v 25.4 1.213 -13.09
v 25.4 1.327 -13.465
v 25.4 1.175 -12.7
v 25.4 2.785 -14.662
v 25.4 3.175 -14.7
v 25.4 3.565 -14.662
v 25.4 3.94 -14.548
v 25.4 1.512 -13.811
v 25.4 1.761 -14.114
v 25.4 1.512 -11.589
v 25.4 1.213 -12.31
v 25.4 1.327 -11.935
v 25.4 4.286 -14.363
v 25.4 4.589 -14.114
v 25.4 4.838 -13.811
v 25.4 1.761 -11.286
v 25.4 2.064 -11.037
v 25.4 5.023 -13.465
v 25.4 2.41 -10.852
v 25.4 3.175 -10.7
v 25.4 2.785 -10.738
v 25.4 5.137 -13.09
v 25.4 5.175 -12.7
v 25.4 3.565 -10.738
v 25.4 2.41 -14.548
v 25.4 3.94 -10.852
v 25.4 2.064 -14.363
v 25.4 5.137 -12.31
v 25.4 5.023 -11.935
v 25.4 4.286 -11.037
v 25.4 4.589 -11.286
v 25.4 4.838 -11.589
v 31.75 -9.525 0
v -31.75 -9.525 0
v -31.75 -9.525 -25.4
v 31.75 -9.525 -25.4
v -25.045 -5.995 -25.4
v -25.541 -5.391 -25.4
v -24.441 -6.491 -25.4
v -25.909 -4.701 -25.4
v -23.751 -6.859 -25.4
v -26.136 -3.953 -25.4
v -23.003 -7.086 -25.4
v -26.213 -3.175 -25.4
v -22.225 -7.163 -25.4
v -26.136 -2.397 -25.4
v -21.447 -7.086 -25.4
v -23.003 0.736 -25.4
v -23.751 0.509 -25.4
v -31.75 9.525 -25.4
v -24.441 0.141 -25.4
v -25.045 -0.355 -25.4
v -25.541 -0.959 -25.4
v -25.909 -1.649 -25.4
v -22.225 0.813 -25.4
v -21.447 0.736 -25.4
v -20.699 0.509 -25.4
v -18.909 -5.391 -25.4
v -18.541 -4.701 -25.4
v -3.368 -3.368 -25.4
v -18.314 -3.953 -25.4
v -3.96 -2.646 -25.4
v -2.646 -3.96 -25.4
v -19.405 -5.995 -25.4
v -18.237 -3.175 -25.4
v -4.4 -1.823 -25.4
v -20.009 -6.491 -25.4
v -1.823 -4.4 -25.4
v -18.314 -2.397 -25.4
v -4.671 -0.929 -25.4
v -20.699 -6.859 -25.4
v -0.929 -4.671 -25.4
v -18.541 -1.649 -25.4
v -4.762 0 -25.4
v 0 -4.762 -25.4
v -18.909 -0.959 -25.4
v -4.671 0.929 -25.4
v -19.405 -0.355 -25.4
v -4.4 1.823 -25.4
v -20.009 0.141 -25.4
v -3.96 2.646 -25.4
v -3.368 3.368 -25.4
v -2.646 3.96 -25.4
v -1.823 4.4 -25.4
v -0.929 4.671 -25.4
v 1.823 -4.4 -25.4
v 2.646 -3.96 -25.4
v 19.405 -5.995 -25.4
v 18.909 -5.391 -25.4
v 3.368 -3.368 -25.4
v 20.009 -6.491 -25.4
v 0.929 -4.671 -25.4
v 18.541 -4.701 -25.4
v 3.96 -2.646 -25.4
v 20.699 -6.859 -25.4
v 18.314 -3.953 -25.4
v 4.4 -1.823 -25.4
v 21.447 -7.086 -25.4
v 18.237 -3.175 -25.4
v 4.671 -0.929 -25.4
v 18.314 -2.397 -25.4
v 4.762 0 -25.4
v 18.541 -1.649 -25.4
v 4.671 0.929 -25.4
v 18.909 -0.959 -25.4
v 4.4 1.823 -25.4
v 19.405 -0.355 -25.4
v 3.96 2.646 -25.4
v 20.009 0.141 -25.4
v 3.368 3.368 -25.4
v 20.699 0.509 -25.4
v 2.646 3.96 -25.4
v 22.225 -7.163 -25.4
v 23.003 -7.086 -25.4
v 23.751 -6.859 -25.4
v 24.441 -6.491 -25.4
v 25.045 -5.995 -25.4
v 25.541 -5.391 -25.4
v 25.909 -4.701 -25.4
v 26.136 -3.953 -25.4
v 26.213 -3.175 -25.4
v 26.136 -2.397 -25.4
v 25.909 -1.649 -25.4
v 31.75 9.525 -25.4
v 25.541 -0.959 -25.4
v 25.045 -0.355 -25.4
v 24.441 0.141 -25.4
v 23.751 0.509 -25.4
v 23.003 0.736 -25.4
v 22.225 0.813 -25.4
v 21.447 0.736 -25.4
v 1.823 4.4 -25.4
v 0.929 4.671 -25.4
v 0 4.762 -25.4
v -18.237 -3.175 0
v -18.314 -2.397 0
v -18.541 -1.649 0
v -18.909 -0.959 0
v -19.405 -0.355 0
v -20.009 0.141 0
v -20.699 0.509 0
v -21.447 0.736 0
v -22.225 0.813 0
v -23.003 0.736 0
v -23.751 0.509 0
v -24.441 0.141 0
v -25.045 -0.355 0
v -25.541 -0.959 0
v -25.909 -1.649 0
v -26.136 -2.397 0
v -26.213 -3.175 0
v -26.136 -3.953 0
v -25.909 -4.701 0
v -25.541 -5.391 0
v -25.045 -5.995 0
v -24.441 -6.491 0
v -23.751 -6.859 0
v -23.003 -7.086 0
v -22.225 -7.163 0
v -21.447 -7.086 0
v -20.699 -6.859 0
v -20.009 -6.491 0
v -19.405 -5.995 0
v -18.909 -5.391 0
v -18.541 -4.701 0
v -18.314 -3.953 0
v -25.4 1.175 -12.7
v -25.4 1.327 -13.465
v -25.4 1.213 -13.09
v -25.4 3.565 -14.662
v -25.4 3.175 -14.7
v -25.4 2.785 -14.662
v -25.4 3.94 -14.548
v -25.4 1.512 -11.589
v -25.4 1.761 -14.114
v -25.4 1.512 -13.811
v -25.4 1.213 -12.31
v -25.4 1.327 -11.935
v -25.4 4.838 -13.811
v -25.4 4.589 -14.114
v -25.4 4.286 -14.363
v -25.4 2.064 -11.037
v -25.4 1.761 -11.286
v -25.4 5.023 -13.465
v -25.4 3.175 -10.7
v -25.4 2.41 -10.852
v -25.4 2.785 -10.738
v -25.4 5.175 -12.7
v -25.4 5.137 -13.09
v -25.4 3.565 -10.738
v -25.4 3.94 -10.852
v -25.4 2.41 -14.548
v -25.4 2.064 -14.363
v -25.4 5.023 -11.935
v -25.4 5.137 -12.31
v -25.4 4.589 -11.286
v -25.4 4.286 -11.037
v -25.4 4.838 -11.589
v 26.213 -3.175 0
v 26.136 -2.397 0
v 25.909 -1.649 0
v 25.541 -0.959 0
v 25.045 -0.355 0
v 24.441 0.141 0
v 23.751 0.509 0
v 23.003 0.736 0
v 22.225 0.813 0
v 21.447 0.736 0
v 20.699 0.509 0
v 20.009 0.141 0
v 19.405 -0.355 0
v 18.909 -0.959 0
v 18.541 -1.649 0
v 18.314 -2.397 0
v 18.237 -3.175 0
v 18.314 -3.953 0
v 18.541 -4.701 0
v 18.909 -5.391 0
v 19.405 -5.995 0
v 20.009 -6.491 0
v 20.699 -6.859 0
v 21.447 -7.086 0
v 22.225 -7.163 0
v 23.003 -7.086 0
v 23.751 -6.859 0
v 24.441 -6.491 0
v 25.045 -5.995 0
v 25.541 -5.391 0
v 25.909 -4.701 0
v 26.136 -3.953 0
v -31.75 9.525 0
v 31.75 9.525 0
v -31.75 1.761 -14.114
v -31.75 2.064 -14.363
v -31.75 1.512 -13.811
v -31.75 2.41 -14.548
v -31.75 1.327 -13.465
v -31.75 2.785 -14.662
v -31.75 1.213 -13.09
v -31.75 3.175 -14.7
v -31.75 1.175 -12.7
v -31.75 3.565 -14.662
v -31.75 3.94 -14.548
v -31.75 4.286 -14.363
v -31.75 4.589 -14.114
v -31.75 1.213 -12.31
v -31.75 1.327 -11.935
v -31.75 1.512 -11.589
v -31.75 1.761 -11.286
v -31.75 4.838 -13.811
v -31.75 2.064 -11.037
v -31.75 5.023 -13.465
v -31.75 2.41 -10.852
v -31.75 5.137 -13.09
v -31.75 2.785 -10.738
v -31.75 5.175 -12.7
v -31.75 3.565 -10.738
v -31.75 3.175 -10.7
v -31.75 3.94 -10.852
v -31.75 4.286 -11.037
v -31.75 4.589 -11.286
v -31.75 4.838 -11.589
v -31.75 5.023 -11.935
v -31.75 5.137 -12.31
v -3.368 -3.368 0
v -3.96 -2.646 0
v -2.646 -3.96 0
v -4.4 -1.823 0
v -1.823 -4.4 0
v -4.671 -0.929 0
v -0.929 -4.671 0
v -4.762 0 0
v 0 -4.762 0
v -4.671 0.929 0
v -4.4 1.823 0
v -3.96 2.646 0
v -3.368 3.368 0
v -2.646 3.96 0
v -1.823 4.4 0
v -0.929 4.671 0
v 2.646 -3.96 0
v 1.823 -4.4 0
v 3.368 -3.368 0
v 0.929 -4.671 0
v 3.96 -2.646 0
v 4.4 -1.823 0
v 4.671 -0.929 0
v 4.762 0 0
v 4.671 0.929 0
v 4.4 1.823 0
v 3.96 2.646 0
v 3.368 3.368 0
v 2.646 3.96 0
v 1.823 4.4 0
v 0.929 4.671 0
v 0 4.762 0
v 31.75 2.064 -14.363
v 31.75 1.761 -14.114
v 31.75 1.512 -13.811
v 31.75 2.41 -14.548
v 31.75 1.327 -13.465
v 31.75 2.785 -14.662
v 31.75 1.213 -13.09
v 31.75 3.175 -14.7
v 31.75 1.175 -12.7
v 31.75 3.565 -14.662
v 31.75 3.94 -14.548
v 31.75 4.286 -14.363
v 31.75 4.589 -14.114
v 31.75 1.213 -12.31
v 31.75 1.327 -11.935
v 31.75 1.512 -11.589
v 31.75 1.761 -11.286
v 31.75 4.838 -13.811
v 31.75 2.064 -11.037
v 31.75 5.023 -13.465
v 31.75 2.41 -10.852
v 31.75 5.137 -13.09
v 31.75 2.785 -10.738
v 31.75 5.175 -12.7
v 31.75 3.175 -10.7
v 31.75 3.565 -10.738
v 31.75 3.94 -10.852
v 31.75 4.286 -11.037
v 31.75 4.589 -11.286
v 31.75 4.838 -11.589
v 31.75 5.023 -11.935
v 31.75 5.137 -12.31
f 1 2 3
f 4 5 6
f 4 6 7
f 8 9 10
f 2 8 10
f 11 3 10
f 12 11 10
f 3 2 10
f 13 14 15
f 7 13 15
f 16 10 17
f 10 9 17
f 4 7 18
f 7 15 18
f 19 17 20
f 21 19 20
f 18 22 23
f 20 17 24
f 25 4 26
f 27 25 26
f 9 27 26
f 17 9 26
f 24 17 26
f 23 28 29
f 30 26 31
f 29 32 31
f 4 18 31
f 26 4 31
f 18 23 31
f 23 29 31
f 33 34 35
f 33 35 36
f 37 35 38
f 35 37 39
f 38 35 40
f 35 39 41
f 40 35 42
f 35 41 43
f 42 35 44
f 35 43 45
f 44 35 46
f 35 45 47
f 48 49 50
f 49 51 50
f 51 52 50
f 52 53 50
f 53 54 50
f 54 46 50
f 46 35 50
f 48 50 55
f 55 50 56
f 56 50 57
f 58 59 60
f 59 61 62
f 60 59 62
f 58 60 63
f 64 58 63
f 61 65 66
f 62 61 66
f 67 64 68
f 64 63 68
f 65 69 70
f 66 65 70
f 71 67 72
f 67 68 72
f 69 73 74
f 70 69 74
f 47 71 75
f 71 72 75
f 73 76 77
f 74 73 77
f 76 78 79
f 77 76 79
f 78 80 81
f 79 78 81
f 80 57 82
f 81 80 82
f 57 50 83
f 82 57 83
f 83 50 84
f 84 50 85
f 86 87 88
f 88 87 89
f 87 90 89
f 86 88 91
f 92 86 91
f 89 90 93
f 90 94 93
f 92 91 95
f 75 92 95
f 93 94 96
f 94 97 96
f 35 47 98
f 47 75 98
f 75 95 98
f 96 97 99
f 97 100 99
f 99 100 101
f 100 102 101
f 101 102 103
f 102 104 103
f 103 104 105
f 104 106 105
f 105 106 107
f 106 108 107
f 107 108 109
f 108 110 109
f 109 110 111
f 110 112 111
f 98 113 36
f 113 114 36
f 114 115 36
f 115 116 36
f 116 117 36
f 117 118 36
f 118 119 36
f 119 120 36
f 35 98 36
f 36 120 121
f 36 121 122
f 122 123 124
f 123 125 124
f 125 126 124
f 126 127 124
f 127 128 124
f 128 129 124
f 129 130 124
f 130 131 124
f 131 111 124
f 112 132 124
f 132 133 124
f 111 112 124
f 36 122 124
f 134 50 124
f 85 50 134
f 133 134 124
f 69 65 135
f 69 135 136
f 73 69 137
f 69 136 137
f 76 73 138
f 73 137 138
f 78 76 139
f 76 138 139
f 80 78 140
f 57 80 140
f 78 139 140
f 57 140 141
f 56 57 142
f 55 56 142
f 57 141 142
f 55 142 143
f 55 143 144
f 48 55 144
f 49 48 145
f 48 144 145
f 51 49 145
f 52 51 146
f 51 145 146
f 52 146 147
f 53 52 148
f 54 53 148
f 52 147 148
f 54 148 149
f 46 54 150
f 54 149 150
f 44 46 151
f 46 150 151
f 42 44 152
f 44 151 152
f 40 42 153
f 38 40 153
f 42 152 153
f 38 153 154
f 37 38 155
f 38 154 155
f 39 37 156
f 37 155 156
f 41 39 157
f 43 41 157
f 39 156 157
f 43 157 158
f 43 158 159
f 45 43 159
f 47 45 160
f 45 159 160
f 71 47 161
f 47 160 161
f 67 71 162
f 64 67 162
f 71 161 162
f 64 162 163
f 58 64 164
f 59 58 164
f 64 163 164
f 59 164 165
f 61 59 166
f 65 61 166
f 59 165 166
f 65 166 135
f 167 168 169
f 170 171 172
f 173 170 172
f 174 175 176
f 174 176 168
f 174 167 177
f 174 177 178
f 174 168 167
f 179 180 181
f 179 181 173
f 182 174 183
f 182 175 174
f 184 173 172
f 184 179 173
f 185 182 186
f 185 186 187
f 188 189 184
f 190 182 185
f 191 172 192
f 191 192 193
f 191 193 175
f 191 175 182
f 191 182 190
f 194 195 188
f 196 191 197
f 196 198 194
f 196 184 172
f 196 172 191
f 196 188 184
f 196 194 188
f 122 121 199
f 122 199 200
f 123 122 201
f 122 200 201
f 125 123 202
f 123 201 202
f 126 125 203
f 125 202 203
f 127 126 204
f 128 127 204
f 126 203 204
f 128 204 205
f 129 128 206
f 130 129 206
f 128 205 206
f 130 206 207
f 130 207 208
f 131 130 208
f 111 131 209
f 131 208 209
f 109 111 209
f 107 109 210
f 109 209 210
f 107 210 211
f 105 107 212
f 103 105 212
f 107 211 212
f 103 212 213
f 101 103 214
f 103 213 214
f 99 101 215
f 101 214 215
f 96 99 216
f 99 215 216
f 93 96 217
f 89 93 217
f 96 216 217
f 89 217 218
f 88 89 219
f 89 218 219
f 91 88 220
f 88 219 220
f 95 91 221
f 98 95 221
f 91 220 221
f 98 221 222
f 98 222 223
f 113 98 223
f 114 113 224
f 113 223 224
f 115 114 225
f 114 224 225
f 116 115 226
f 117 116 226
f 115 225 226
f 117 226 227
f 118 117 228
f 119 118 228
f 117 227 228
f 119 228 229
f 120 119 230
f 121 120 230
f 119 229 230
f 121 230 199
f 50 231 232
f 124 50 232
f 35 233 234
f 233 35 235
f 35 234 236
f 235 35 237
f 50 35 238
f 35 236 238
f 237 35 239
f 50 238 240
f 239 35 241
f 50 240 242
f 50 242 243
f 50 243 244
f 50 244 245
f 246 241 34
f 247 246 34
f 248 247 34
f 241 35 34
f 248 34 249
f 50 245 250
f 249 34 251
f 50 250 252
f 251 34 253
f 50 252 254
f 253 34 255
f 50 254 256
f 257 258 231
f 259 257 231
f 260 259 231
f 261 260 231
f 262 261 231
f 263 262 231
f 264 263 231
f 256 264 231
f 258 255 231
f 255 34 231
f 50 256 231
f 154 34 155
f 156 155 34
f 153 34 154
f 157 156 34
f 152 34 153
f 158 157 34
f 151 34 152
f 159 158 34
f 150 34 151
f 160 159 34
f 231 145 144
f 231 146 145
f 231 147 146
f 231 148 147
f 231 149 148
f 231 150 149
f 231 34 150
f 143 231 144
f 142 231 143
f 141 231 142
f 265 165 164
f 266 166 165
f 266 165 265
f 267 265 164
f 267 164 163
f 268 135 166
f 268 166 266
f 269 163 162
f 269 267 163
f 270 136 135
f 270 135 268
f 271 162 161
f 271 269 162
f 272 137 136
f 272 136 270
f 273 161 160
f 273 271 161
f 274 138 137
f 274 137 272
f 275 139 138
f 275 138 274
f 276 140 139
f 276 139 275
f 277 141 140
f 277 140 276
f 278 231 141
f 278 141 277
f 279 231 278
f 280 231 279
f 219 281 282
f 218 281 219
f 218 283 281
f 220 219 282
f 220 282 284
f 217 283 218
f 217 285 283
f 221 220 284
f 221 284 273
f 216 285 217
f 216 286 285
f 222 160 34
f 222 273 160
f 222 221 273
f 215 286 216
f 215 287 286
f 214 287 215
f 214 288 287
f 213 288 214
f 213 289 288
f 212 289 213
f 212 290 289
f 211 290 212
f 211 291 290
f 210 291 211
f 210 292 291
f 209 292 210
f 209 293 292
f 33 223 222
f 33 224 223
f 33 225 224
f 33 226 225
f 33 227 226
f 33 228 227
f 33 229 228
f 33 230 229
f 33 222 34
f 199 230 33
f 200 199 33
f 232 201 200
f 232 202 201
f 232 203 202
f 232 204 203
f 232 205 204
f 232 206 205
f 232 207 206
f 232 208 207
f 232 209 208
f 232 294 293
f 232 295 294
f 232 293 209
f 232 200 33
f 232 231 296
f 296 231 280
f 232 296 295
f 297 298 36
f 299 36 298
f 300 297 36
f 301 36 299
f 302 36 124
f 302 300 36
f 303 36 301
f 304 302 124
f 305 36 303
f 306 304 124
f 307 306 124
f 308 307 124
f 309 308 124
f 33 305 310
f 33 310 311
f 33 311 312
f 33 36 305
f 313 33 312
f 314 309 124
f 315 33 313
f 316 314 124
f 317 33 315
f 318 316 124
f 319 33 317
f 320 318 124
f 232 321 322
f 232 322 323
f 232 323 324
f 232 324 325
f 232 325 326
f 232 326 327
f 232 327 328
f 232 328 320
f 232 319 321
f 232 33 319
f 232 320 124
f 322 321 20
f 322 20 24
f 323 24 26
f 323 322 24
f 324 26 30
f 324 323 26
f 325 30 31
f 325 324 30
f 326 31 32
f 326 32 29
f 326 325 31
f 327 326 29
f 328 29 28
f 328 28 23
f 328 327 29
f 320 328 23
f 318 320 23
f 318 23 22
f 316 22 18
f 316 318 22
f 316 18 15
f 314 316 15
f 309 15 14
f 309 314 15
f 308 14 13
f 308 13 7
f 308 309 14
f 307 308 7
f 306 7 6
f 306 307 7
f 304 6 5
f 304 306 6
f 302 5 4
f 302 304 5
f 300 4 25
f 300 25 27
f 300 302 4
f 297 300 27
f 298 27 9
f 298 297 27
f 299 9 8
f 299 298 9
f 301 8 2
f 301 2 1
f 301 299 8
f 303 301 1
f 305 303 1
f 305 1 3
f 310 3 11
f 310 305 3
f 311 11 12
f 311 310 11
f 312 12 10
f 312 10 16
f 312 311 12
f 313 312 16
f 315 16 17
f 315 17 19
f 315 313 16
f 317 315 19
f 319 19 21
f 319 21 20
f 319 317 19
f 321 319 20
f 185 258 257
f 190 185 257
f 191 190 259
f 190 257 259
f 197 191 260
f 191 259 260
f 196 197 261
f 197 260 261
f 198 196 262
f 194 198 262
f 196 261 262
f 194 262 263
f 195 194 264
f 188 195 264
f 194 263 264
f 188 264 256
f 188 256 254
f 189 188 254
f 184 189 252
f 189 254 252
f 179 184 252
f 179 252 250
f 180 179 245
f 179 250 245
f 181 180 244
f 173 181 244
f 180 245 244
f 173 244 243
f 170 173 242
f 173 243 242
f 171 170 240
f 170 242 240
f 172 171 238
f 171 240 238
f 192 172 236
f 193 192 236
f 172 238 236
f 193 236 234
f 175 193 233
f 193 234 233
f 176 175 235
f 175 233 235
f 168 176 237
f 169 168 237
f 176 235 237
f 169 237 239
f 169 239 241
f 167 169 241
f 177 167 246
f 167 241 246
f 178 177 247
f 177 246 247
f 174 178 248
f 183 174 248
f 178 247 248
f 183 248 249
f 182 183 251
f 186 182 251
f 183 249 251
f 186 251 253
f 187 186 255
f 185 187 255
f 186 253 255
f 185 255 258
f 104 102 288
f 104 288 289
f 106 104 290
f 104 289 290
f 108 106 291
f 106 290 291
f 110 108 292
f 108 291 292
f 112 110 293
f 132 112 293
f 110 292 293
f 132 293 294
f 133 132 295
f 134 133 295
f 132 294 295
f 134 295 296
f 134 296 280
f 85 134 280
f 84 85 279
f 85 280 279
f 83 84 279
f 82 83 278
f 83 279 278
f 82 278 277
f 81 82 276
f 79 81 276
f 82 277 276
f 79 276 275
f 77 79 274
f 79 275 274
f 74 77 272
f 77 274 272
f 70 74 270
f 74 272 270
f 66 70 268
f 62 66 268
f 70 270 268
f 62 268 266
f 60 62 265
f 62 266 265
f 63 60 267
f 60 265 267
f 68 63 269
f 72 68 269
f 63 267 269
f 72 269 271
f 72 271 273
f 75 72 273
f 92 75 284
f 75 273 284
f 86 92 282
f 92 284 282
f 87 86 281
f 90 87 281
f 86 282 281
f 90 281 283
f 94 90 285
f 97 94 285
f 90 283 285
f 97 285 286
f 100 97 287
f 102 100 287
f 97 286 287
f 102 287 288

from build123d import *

# Parameters (mm, degrees)
SKETCH1_W           = 63.5
SKETCH1_H           = 19.05
SKETCH1_R           = 4.7625
SKETCH1_R_2         = 3.9878
BOSS_EXTRUDE1_DEPTH = 25.4
SKETCH2_R           = 2
CUT_EXTRUDE1_DEPTH  = 6.35


with BuildPart() as part:
    # Sketch1 → Boss-Extrude1 (new body)
    with BuildSketch(Plane.XY):
        Rectangle(SKETCH1_W, SKETCH1_H)
        Circle(SKETCH1_R, mode=Mode.SUBTRACT)
        with Locations((-22.225, -3.175)):
            Circle(SKETCH1_R_2, mode=Mode.SUBTRACT)
        with Locations((22.225, -3.175)):
            Circle(SKETCH1_R_2, mode=Mode.SUBTRACT)
    extrude(amount=-BOSS_EXTRUDE1_DEPTH)

    # Sketch2 → Cut-Extrude1 (cut)
    with BuildSketch(Plane.ZY.offset(31.75)):
        with Locations((-12.7, 3.175)):
            Circle(SKETCH2_R)
    cut_extrude1 = extrude(amount=-CUT_EXTRUDE1_DEPTH, mode=Mode.SUBTRACT)

    # Mirror1: Cut-Extrude1 across plane
    add(cut_extrude1.mirror(Plane.ZY), mode=Mode.SUBTRACT)


solid = part.part
